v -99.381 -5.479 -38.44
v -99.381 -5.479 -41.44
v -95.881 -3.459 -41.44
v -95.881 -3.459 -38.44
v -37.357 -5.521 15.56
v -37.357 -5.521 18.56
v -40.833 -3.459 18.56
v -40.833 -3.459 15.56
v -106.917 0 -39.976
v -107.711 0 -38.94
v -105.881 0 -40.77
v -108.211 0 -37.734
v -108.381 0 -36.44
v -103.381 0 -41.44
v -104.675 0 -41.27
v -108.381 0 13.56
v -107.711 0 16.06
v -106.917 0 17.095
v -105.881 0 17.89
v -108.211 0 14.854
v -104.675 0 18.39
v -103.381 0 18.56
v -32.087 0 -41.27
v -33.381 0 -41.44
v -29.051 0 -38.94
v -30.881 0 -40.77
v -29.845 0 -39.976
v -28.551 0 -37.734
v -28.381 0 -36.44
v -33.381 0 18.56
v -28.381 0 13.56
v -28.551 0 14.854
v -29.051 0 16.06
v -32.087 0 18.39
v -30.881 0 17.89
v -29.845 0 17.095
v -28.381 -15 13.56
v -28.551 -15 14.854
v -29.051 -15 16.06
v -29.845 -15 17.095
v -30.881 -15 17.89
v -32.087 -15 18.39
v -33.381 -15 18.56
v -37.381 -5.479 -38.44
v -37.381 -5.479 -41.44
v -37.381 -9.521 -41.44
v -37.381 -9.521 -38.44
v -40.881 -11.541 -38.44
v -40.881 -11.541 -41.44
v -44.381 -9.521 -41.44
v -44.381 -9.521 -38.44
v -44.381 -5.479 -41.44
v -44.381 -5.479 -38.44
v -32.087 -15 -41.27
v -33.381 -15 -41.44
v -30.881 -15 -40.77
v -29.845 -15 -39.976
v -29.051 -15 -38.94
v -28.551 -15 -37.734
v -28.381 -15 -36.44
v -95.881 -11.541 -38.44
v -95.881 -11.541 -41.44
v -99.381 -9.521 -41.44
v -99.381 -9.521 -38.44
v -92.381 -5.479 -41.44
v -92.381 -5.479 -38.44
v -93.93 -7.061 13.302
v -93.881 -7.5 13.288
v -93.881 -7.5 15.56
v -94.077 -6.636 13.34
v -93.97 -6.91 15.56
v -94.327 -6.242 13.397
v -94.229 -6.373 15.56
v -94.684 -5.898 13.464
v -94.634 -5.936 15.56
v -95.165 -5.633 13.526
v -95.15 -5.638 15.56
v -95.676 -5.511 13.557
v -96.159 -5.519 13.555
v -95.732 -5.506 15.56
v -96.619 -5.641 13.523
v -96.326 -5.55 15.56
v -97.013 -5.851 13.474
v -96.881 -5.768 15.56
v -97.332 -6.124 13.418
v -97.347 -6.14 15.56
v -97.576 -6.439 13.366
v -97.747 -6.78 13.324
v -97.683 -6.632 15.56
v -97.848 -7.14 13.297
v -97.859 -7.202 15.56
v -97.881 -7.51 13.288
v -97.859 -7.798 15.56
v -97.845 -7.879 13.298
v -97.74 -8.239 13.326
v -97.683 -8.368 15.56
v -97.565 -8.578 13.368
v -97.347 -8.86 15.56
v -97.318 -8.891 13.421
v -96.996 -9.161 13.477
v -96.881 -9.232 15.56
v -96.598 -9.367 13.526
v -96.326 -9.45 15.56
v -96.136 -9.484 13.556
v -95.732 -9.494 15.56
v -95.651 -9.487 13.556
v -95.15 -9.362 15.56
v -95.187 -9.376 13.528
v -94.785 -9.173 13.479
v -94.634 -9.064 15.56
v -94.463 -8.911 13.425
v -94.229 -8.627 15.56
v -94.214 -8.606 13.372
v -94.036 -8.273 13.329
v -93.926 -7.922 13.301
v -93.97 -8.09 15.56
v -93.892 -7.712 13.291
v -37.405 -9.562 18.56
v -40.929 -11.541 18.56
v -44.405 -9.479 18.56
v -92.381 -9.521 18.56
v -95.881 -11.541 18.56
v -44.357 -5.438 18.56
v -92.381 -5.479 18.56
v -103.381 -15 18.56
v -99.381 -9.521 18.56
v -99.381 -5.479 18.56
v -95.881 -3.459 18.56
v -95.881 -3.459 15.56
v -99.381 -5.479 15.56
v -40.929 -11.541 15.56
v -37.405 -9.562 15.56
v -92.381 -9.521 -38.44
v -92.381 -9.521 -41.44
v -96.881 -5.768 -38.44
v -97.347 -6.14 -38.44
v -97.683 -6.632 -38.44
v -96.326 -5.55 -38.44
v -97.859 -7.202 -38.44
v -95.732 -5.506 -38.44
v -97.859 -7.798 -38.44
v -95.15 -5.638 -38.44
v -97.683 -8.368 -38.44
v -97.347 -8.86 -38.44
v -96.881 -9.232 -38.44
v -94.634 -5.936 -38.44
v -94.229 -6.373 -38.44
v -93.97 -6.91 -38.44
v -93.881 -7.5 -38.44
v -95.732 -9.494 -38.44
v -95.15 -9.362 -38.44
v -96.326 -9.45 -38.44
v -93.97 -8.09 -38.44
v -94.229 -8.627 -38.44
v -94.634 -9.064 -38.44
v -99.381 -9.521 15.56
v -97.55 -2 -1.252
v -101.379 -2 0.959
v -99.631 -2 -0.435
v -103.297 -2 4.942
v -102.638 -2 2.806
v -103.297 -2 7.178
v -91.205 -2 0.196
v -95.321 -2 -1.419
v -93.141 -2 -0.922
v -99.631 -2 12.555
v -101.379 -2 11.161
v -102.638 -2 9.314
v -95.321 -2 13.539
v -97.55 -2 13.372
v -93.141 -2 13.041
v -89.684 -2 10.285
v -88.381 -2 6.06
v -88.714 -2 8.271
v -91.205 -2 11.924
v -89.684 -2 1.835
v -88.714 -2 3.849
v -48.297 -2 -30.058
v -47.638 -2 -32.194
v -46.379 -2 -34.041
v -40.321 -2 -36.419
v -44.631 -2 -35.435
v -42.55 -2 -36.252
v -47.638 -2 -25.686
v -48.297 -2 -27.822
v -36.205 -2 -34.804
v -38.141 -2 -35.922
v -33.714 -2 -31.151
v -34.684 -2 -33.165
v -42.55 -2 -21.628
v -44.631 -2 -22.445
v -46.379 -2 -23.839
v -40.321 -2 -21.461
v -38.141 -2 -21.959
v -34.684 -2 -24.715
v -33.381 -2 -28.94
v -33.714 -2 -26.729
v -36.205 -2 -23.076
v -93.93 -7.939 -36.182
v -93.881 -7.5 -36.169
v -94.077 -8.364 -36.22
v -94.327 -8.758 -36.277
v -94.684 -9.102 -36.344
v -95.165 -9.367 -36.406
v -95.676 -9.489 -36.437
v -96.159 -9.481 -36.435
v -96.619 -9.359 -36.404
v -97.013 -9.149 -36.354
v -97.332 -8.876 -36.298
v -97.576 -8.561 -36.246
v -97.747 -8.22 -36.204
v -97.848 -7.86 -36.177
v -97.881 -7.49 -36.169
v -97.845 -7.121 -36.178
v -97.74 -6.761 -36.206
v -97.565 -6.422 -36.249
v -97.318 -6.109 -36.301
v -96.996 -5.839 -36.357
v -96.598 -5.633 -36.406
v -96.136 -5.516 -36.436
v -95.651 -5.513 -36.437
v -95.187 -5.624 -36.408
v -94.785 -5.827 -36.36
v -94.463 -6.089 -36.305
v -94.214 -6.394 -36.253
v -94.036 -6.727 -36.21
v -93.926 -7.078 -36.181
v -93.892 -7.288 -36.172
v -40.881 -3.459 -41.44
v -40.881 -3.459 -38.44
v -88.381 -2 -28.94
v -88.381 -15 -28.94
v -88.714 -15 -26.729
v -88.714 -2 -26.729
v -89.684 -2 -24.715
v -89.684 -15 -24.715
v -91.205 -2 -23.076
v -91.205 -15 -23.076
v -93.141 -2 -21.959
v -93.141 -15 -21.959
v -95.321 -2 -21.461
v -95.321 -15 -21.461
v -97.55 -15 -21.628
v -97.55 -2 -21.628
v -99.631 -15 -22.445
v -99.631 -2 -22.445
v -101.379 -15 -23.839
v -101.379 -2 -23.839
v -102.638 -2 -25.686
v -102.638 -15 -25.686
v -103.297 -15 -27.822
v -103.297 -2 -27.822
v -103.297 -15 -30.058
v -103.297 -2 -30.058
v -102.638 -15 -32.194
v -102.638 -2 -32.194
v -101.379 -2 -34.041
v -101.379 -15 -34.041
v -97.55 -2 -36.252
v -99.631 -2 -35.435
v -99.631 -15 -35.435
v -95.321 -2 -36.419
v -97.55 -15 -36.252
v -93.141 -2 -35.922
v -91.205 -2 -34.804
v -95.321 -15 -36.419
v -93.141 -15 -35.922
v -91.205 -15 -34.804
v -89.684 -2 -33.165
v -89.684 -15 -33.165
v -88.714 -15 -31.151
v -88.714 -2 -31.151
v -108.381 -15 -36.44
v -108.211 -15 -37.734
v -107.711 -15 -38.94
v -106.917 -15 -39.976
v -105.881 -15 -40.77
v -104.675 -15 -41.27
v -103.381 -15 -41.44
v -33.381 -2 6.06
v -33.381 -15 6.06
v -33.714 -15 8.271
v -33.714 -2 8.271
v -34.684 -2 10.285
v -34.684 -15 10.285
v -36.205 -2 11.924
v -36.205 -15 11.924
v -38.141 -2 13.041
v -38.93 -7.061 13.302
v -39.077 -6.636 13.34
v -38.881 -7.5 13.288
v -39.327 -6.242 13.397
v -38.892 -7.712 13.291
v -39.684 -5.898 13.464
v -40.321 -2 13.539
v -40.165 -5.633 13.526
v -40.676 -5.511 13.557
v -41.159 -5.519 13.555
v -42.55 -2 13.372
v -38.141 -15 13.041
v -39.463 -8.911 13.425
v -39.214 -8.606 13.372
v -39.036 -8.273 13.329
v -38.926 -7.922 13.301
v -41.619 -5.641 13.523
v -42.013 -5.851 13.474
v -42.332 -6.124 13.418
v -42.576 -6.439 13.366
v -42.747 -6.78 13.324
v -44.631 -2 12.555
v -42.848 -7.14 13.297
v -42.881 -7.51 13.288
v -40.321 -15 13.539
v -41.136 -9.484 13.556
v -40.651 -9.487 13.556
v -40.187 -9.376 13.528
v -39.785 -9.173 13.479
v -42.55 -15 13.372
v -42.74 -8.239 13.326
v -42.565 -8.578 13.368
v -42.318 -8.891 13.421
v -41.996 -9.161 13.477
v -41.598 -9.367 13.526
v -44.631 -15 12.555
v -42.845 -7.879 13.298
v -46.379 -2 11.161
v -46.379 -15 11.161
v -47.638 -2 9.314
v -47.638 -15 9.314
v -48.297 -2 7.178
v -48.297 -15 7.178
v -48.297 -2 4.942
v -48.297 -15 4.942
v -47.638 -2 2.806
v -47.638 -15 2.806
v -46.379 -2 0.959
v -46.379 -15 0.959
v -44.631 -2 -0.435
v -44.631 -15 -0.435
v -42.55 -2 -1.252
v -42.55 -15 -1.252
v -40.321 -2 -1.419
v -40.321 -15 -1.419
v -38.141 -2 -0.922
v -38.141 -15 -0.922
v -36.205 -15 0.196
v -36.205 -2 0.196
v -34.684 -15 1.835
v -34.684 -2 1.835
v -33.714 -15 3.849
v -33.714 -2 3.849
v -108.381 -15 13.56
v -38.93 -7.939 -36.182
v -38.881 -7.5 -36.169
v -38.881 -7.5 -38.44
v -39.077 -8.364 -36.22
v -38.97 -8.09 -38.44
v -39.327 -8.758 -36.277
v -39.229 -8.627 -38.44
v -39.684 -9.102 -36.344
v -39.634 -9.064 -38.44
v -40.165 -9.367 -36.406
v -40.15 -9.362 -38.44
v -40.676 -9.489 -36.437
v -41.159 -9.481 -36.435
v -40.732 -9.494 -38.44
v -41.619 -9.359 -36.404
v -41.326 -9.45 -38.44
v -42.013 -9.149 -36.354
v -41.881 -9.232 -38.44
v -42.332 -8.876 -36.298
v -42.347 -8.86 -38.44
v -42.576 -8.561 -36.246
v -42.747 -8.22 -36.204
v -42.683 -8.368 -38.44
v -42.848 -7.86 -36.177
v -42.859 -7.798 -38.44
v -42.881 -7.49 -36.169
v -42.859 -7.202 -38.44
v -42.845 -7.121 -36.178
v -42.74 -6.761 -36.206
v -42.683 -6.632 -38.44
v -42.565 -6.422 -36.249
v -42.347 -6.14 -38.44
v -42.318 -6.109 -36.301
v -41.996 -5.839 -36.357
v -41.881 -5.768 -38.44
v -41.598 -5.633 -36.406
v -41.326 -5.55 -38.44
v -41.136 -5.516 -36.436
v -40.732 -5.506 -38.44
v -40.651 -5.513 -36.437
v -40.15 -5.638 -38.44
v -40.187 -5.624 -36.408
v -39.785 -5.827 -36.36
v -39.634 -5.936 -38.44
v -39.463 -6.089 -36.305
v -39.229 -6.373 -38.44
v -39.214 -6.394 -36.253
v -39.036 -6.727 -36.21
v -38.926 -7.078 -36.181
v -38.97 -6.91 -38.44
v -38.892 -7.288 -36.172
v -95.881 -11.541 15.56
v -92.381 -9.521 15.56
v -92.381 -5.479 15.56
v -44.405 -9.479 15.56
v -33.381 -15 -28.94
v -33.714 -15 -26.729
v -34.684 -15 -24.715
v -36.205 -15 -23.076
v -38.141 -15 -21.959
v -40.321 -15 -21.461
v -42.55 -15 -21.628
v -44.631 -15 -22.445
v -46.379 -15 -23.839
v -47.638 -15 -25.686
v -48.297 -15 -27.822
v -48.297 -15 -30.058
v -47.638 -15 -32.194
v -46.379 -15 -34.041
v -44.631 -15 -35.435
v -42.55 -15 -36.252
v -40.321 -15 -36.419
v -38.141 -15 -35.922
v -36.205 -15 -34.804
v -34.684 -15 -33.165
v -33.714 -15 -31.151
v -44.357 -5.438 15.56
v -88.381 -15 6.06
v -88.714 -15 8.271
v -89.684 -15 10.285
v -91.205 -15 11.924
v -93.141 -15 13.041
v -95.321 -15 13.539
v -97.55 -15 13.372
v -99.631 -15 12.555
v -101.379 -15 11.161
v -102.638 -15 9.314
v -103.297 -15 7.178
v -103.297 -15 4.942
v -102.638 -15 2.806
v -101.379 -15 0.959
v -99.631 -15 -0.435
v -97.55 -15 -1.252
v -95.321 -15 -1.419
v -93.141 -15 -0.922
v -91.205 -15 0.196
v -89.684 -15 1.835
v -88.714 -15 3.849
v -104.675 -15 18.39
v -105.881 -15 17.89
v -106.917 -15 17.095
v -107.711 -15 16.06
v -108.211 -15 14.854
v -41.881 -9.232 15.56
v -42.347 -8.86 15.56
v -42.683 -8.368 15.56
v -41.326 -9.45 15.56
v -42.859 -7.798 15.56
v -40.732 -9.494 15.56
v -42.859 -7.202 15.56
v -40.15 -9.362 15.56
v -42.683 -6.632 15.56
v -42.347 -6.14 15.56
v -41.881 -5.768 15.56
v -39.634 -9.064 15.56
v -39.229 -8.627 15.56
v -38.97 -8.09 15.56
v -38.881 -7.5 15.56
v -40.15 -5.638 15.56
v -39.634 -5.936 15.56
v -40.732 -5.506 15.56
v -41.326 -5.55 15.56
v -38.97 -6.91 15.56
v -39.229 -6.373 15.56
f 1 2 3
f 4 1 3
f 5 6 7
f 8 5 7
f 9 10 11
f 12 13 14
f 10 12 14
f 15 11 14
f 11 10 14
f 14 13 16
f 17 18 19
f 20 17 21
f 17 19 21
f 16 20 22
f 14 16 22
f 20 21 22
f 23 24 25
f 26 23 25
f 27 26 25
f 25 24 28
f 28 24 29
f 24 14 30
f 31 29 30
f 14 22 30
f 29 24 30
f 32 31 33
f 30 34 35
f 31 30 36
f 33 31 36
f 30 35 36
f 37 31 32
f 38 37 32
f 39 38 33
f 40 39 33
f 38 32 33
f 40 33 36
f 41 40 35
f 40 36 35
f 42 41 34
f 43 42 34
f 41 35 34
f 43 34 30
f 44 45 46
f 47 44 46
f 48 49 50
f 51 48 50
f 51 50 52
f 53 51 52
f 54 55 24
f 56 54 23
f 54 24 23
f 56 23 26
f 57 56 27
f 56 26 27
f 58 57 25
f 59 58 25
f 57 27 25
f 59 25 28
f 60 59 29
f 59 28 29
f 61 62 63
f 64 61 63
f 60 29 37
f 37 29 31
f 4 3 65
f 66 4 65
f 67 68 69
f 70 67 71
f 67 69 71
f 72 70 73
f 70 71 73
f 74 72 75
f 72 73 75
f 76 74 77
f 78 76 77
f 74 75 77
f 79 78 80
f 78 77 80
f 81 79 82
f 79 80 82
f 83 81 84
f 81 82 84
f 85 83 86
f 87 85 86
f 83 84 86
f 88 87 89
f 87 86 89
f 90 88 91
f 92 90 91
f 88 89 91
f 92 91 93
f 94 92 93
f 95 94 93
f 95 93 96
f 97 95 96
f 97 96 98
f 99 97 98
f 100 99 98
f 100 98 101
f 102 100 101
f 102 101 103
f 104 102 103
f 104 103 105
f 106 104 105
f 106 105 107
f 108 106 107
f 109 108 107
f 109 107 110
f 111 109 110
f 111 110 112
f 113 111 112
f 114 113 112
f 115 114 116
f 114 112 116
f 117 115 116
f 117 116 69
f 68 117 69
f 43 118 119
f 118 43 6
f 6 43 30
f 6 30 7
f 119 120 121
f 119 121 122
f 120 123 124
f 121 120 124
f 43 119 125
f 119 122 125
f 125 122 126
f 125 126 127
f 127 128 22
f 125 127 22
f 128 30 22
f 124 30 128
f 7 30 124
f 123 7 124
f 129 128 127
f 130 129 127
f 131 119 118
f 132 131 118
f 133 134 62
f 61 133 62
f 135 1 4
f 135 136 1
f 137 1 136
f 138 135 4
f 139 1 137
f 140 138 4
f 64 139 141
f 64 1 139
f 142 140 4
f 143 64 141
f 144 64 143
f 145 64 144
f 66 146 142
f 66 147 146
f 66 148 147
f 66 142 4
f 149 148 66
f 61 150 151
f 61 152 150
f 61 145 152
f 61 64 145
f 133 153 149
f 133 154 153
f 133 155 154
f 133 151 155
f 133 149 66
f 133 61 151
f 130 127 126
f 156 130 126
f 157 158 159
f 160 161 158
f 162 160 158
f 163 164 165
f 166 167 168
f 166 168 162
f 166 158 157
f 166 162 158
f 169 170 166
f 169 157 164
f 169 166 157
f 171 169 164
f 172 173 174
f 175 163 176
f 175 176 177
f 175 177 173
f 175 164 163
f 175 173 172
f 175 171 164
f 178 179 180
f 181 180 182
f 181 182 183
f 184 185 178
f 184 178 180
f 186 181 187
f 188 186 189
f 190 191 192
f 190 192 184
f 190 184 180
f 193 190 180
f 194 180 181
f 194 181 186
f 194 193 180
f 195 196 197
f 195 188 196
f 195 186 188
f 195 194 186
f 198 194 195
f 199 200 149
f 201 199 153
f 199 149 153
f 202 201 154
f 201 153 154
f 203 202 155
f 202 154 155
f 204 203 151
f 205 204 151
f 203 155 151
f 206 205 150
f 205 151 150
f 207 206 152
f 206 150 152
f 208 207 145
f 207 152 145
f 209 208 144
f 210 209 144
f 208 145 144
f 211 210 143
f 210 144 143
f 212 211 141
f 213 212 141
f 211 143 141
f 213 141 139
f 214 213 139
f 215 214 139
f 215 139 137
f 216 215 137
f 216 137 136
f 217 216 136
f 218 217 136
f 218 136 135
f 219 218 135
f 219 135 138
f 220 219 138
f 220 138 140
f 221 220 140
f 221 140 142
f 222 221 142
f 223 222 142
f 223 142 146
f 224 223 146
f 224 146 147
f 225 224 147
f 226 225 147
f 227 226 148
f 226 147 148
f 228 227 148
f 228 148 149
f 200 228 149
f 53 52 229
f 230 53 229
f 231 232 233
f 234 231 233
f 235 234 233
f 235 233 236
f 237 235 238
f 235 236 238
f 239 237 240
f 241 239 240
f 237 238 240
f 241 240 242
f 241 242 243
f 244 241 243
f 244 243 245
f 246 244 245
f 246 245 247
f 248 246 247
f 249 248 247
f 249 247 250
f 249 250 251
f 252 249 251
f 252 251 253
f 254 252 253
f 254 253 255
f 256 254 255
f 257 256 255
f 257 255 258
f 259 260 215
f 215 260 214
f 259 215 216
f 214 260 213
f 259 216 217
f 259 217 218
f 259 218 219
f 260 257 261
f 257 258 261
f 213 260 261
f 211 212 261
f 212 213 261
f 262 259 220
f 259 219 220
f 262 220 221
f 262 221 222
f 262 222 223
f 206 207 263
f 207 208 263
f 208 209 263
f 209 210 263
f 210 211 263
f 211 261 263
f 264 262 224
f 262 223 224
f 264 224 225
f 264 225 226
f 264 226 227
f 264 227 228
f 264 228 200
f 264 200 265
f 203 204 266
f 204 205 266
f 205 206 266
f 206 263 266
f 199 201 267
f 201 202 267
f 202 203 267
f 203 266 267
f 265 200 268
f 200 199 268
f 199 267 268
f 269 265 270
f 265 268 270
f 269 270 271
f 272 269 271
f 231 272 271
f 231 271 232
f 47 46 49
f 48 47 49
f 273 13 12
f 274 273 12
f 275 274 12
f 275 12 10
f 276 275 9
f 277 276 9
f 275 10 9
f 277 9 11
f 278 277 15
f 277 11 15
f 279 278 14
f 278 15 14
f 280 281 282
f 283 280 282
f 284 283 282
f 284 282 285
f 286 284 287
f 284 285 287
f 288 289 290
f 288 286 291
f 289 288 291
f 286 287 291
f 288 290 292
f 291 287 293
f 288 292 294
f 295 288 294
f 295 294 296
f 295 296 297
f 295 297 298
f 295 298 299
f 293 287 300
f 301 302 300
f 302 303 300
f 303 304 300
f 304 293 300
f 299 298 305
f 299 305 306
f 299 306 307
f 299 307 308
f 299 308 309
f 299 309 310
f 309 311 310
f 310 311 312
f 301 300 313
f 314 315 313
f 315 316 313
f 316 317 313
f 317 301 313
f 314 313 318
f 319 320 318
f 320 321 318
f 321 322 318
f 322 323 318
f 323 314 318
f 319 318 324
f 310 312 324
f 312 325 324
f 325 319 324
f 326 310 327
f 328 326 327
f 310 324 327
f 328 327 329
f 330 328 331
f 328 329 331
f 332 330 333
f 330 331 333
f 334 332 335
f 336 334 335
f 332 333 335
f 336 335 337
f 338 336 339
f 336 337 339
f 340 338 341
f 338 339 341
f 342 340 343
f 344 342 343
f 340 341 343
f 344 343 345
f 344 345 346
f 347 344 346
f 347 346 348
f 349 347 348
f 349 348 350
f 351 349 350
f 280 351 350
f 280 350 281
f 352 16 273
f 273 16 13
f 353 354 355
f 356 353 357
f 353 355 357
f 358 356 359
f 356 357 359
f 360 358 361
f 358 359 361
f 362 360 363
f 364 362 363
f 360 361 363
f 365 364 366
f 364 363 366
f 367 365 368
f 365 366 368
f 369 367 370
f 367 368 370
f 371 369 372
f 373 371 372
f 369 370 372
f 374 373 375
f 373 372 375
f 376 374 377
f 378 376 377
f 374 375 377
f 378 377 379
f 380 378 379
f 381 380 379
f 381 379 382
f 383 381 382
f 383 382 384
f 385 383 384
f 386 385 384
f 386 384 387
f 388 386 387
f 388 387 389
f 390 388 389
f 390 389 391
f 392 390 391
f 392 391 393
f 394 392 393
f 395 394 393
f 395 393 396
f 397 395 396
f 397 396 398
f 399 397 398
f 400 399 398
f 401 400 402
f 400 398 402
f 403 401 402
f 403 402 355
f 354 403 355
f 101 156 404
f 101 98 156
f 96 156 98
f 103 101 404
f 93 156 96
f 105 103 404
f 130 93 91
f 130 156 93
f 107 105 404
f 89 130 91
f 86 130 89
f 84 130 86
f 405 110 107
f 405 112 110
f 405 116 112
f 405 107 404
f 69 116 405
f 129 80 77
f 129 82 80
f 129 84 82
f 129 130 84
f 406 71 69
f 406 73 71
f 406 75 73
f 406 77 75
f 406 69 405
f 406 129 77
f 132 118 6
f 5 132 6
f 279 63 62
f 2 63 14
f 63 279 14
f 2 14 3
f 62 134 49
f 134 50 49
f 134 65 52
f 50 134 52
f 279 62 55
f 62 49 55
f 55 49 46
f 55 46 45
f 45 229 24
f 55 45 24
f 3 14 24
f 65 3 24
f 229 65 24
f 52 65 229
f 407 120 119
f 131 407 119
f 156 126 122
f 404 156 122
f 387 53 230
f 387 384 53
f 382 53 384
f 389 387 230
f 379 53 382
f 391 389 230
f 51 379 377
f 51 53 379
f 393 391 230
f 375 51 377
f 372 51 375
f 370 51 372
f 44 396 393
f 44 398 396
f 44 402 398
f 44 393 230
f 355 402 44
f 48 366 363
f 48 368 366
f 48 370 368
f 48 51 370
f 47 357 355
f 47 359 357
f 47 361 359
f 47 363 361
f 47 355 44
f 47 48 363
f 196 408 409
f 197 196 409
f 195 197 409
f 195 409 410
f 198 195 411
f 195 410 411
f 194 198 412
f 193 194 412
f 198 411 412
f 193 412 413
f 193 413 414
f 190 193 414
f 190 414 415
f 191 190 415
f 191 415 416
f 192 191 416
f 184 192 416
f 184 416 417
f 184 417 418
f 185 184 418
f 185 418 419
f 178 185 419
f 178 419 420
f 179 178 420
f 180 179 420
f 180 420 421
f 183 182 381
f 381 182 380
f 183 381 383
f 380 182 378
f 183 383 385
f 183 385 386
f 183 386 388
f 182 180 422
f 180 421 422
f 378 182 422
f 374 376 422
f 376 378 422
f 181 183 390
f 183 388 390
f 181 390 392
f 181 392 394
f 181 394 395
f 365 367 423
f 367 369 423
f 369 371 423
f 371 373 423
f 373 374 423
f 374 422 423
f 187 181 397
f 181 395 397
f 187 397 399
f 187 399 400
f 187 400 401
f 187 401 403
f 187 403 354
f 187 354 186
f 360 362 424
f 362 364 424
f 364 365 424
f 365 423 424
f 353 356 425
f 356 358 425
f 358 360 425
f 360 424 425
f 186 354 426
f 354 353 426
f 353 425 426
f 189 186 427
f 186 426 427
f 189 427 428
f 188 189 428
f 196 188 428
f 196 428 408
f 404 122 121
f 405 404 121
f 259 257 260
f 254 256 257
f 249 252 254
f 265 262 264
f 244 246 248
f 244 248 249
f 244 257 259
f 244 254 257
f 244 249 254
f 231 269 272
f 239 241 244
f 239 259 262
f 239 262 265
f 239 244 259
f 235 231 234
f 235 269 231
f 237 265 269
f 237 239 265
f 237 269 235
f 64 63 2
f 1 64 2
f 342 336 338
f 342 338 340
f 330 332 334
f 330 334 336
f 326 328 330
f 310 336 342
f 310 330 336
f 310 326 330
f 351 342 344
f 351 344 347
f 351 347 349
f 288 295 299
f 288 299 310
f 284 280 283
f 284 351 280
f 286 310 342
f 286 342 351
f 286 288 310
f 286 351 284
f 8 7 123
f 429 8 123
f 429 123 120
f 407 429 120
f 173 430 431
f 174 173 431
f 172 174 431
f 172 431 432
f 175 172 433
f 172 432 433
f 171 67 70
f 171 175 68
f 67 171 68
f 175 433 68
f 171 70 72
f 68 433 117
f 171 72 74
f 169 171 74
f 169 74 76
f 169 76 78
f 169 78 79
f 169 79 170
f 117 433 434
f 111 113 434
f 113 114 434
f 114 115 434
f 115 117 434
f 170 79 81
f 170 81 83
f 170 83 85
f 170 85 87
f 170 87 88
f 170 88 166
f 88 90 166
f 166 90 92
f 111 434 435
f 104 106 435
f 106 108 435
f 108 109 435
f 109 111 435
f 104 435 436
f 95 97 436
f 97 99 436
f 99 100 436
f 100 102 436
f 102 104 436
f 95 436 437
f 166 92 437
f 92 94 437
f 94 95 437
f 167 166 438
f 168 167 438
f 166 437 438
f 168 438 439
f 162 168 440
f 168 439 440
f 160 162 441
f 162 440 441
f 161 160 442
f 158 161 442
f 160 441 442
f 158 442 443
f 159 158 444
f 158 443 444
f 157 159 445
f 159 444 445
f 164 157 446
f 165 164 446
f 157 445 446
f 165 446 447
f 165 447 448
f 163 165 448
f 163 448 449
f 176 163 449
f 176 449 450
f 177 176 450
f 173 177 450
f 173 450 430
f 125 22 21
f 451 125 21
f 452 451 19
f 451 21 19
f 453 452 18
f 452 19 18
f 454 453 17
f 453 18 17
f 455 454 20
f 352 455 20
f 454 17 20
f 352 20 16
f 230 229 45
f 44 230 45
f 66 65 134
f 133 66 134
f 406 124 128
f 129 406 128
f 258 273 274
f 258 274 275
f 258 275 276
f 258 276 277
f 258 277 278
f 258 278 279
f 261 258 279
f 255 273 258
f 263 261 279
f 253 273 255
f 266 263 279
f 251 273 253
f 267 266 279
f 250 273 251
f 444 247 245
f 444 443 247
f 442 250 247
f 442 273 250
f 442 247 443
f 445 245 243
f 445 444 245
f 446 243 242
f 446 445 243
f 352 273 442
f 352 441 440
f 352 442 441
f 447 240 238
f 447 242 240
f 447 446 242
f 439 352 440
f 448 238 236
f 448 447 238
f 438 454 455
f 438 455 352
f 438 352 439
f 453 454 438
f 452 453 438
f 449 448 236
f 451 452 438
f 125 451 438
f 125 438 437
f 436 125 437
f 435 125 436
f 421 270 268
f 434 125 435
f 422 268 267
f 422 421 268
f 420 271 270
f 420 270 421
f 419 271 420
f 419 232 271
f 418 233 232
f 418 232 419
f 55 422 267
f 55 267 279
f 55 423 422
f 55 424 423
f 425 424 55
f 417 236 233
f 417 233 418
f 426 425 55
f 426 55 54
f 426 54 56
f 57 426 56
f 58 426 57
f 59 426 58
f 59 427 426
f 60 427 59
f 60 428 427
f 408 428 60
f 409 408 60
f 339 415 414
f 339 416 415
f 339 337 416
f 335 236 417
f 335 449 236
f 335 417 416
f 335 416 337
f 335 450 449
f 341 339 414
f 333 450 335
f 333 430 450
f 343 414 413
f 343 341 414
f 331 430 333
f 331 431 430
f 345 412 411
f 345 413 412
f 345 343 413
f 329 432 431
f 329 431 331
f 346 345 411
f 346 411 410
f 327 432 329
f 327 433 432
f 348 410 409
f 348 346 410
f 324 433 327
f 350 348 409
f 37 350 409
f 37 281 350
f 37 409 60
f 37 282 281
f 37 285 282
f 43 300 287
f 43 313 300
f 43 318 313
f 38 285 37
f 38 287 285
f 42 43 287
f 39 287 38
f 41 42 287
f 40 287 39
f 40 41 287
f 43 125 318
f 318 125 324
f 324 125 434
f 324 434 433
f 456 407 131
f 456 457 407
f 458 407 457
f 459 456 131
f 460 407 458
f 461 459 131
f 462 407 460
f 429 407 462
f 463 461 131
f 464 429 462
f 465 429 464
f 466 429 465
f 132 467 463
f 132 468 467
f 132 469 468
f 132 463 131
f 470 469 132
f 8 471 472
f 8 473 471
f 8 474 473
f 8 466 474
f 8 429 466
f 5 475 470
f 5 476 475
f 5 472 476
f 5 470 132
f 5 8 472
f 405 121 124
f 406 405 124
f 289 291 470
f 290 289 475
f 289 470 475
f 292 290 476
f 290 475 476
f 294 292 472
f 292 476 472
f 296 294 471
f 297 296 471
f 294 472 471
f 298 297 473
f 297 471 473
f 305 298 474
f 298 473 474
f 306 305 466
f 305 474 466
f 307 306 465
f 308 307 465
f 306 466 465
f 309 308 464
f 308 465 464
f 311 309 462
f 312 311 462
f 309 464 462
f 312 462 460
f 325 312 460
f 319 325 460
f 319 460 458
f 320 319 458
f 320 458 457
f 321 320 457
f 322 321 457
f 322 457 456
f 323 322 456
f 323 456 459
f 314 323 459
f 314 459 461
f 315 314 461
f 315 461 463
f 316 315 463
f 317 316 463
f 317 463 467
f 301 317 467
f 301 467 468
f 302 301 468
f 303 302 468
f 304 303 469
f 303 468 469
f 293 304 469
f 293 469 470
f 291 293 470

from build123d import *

# Parameters (mm, degrees)
F1_DEPTH  = 15
F2_R      = 7.5
F3_DEPTH  = 13
F4_R      = 2
F5_DEPTH  = 6
F7_DEPTH  = 3
F8_R      = 2
F9_DEPTH  = 6
F11_DEPTH = 3


with BuildPart() as f1:
    # F0 (on Front) → F1 (new body)
    with BuildSketch(Plane.XZ):
        with BuildLine():
            Line((-33.380991, 18.559887), (-103.380991, 18.559887))
            ThreePointArc((-103.380991, 18.559887), (-106.916525, 17.095421), (-108.380991, 13.559887))
            Line((-108.380991, 13.559887), (-108.380991, -36.440113))
            ThreePointArc((-108.380991, -36.440113), (-106.916525, -39.975647), (-103.380991, -41.440113))
            Line((-103.380991, -41.440113), (-33.380991, -41.440113))
            ThreePointArc((-33.380991, -41.440113), (-29.845457, -39.975647), (-28.380991, -36.440113))
            Line((-28.380991, -36.440113), (-28.380991, 13.559887))
            ThreePointArc((-28.380991, 13.559887), (-29.845457, 17.095421), (-33.380991, 18.559887))
        make_face()
    extrude(amount=F1_DEPTH)

    # F2 (on face) → F3 (cut)
    with BuildSketch(Plane.XZ.offset(15)):
        with Locations((-95.880991, 6.059887)):
            Circle(F2_R)
        with Locations((-95.880991, -28.940113)):
            Circle(F2_R)
        with Locations((-40.880991, 6.059887)):
            Circle(F2_R)
        with Locations((-40.880991, -28.940113)):
            Circle(F2_R)
    extrude(amount=-F3_DEPTH, mode=Mode.SUBTRACT)

    # F4 (on face) → F5 (cut)
    with BuildSketch(Plane.XY.offset(18.559887)):
        with Locations((-40.880991, -7.5)):
            Circle(F4_R)
        with Locations((-95.880991, -7.5)):
            Circle(F4_R)
    extrude(amount=-F5_DEPTH, mode=Mode.SUBTRACT)

    # F6 (on face) → F7 (cut)
    with BuildSketch(Plane.XY.offset(18.559887)):
        Polygon((-92.380991, -9.520726), (-92.380991, -5.479274), (-95.880991, -3.458548), (-99.380991, -5.479274), (-99.380991, -9.520726), (-95.880991, -11.541452), align=None)
        Polygon((-40.929128, -11.541165), (-37.405308, -9.56227), (-37.357171, -5.521105), (-40.832854, -3.458835), (-44.356675, -5.43773), (-44.404811, -9.478895), align=None)
    extrude(amount=-F7_DEPTH, mode=Mode.SUBTRACT)

    # F8 (on face) → F9 (cut)
    with BuildSketch(Plane(origin=(0, 0, -41.440113), x_dir=(1, 0, 0), z_dir=(0, 0, -1))):
        with Locations((-95.880991, 7.5)):
            Circle(F8_R)
        with Locations((-40.880991, 7.5)):
            Circle(F8_R)
    extrude(amount=-F9_DEPTH, mode=Mode.SUBTRACT)

    # F10 (on face) → F11 (cut)
    with BuildSketch(Plane(origin=(0, 0, -41.440113), x_dir=(1, 0, 0), z_dir=(0, 0, -1))):
        Polygon((-92.380991, 5.479274), (-92.380991, 9.520726), (-95.880991, 11.541452), (-99.380991, 9.520726), (-99.380991, 5.479274), (-95.880991, 3.458548), align=None)
        Polygon((-37.380991, 5.479274), (-37.380991, 9.520726), (-40.880991, 11.541452), (-44.380991, 9.520726), (-44.380991, 5.479274), (-40.880991, 3.458548), align=None)
    extrude(amount=-F11_DEPTH, mode=Mode.SUBTRACT)


solid = f1.part
